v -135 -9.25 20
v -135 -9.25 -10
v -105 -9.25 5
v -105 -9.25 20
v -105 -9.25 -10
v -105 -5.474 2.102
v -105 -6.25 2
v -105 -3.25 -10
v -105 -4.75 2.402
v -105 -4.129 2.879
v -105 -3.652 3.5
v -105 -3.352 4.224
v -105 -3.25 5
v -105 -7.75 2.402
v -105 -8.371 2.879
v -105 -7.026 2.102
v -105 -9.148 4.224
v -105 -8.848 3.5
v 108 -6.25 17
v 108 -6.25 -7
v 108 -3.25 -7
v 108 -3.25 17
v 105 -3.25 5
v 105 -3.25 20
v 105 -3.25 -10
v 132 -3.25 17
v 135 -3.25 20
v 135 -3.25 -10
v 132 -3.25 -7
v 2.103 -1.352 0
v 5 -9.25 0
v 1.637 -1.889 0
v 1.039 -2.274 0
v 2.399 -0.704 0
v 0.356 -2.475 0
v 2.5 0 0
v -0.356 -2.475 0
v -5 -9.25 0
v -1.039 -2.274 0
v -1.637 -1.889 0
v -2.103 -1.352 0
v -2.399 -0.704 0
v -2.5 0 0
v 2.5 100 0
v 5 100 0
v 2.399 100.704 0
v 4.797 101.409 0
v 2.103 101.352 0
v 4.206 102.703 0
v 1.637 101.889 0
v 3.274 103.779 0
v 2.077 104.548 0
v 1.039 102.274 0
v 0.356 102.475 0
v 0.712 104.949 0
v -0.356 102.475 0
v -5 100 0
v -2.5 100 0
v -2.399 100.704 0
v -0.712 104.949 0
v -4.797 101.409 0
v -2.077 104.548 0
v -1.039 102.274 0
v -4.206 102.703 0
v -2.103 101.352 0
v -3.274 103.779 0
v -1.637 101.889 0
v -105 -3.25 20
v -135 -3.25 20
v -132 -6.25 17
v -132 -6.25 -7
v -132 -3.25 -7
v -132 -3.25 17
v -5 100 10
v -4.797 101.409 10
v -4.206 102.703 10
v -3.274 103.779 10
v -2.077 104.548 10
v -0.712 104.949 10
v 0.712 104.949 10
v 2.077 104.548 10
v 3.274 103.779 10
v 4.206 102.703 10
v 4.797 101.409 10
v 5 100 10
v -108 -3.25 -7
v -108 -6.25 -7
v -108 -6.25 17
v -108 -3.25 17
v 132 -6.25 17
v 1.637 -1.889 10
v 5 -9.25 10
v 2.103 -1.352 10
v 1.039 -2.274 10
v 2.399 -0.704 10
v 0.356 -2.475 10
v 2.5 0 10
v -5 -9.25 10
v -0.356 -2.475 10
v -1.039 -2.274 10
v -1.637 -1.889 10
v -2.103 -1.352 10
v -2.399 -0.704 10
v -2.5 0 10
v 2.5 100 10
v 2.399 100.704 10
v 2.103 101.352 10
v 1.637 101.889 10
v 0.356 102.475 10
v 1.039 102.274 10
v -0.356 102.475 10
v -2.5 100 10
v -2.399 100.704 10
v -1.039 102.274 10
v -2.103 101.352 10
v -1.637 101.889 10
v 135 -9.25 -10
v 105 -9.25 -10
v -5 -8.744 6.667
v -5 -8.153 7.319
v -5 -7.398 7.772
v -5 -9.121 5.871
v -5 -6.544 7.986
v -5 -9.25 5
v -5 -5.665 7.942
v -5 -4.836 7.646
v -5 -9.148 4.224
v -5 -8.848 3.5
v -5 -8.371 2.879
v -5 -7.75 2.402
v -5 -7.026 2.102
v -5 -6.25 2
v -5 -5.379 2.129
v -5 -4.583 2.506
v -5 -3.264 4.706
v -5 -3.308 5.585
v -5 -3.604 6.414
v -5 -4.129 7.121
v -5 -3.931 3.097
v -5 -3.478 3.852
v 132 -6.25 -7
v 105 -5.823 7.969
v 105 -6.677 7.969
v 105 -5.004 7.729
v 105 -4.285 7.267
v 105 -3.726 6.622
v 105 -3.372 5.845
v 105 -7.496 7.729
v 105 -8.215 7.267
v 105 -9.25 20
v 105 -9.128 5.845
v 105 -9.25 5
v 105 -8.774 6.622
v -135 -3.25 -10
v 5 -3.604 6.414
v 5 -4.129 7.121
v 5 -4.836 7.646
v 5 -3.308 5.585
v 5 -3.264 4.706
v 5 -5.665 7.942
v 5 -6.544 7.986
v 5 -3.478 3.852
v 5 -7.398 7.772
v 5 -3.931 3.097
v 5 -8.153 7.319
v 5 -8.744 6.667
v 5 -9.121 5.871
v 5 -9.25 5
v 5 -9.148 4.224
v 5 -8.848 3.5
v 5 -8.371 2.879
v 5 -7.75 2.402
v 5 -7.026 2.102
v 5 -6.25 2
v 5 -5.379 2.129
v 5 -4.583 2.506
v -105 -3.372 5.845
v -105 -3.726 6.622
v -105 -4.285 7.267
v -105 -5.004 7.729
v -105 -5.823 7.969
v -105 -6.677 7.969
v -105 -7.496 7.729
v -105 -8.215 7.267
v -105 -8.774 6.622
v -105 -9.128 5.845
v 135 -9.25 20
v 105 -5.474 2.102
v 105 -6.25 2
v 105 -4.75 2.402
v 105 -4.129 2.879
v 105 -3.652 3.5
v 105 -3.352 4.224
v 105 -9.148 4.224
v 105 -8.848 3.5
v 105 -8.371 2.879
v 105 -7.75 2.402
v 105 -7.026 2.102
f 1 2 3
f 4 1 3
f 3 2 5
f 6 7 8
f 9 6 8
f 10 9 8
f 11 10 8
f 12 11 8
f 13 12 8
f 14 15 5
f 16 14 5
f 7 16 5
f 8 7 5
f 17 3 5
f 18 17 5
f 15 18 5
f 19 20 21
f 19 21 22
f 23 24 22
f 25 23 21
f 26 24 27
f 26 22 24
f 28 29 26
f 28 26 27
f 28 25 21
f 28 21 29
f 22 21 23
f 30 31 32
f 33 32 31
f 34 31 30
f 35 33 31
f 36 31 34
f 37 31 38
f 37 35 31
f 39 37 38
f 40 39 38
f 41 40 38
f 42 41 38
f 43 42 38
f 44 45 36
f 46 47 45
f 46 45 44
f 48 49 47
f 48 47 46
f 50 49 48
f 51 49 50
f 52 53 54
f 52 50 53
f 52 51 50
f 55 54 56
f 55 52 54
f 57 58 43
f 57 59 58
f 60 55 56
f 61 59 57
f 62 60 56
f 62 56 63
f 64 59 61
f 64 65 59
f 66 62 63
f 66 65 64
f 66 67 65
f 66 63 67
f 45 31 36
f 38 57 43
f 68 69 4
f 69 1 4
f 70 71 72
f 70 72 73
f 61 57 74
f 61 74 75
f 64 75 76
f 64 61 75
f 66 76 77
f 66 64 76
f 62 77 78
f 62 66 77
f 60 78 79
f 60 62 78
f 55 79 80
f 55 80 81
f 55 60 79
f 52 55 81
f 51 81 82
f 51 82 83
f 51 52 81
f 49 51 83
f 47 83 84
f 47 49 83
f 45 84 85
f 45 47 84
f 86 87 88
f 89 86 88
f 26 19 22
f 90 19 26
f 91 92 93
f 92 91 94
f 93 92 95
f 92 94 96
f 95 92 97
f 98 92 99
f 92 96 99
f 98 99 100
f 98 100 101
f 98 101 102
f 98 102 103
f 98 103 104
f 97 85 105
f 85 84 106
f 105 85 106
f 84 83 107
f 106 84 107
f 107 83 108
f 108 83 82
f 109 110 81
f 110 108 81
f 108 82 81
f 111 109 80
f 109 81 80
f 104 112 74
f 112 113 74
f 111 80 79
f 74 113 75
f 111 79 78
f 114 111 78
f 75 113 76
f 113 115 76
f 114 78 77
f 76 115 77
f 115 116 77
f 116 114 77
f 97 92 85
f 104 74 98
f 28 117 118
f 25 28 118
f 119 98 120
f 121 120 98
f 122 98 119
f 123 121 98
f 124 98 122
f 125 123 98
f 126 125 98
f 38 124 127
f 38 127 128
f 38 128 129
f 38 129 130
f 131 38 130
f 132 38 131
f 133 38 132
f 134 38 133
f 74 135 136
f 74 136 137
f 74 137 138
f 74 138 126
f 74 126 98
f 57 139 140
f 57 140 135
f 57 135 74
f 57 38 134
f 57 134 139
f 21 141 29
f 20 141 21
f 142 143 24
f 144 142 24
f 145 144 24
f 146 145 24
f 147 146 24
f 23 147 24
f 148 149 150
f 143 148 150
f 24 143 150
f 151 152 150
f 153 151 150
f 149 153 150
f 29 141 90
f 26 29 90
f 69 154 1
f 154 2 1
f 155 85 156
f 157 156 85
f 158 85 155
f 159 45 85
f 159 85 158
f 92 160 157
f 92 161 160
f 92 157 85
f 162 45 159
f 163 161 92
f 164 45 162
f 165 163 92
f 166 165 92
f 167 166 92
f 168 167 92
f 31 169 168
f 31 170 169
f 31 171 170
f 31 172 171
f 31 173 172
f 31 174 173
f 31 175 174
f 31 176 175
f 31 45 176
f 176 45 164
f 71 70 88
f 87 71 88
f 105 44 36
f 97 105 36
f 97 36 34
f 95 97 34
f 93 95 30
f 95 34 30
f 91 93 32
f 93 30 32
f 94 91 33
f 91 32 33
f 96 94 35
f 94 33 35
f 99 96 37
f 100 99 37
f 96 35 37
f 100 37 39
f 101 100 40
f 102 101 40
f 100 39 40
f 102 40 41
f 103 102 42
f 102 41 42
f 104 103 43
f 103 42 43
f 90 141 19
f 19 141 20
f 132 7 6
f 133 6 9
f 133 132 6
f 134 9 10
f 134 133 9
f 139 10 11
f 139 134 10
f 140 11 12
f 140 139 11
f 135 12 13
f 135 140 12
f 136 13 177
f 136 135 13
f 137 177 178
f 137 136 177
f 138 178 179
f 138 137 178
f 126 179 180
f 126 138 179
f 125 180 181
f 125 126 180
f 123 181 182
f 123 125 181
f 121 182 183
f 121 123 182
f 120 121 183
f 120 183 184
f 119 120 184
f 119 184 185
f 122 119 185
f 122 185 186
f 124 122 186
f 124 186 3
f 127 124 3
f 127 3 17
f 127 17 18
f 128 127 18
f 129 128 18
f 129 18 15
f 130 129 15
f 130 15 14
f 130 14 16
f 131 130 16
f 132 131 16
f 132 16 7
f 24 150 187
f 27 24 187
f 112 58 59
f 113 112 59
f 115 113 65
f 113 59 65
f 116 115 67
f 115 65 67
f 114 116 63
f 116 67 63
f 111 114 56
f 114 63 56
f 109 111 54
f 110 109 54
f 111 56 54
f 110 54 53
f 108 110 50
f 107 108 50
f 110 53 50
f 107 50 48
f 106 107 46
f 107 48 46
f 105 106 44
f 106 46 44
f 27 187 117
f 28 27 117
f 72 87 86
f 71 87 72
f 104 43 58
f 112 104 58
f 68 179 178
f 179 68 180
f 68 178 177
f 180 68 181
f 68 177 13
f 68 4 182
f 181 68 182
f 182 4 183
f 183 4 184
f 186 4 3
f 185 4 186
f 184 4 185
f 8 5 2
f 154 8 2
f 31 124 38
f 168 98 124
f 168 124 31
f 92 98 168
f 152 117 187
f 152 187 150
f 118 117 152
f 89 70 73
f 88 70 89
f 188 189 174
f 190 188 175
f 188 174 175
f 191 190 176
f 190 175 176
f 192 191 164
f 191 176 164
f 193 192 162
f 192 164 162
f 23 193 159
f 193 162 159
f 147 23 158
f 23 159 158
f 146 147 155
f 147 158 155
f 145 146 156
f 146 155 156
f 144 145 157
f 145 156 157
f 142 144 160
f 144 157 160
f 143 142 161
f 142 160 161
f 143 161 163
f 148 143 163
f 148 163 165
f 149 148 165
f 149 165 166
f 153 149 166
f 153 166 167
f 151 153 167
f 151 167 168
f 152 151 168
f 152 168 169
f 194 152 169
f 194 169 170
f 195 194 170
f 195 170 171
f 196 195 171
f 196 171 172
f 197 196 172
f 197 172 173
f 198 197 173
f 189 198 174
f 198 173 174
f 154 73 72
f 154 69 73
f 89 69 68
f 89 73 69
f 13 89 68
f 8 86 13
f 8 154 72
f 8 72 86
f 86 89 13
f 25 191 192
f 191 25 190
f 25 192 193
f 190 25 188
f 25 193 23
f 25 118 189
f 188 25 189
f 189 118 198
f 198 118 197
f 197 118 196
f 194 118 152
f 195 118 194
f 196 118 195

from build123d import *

# Parameters (mm, degrees)
BOSS_EXTRUDE2_DEPTH      = 10
SKETCH3_R                = 3
BOSS_EXTRUDE3_DEPTH      = 100
BOSS_EXTRUDE3_DEPTH_BACK = 110
BOSS_EXTRUDE4_DEPTH      = 3
BOSS_EXTRUDE5_DEPTH      = 3
BOSS_EXTRUDE6_DEPTH      = 3
CUT_EXTRUDE1_REACH       = 22
SKETCH9_W                = 10
SKETCH9_H                = 0.75


with BuildPart() as part:
    # Sketch1 → Boss-Extrude2 (new body)
    with BuildSketch(Plane.XY):
        with BuildLine():
            Line((5, 100), (5, 0))
            Line((5, 0), (5, -10))
            Line((5, -10), (-5, -10))
            Line((-5, -10), (-5, 0))
            Line((-5, 0), (-5, 100))
            ThreePointArc((-5, 100), (0, 105), (5, 100))
        make_face()
        with BuildLine():
            Line((-2.5, 0), (-2.5, 100))
            ThreePointArc((-2.5, 100), (0, 102.5), (2.5, 100))
            Line((2.5, 100), (2.5, 0))
            ThreePointArc((2.5, 0), (0, -2.5), (-2.5, 0))
        make_face(mode=Mode.SUBTRACT)
    extrude(amount=BOSS_EXTRUDE2_DEPTH)

    # Sketch3 → Boss-Extrude3 (add, two sides)
    with BuildSketch(Plane(origin=(5, 0, 0), x_dir=(0, 0, -1), z_dir=(1, 0, 0))) as boss_extrude3_sk:
        with Locations((-5, -6.25)):
            Circle(SKETCH3_R)
    extrude(amount=BOSS_EXTRUDE3_DEPTH)
    extrude(boss_extrude3_sk.sketch, amount=-BOSS_EXTRUDE3_DEPTH_BACK)

    # Sketch6 → Boss-Extrude4 (add)
    with BuildSketch(Plane(origin=(0, -9.25, 0), x_dir=(-1, 0, 0), z_dir=(0, -1, 0))):
        Polygon((-105, -2), (-105, 10), (-135, 10), (-135, -20), (-105, -20), (-105, -8), align=None)
        Polygon((105, -2), (105, 10), (135, 10), (135, -20), (105, -20), (105, -8), align=None)
    extrude(amount=-BOSS_EXTRUDE4_DEPTH)

    # Sketch7 → Boss-Extrude5 (add)
    with BuildSketch(Plane(origin=(0, -6.25, 0), x_dir=(1, 0, 0), z_dir=(0, 1, 0))):
        Polygon((-105, -2), (-105, 10), (-135, 10), (-135, -20), (-105, -20), (-105, -8), align=None)
        Polygon((-108, -2), (-108, 7), (-132, 7), (-132, -17), (-108, -17), (-108, -8), align=None, mode=Mode.SUBTRACT)
    extrude(amount=BOSS_EXTRUDE5_DEPTH)

    # Sketch8 → Boss-Extrude6 (add)
    with BuildSketch(Plane(origin=(0, -6.25, 0), x_dir=(1, 0, 0), z_dir=(0, 1, 0))):
        Polygon((135, -2), (135, 10), (105, 10), (105, -20), (135, -20), (135, -8), align=None)
        Polygon((132, -2), (132, 7), (108, 7), (108, -17), (132, -17), (132, -8), align=None, mode=Mode.SUBTRACT)
    extrude(amount=BOSS_EXTRUDE6_DEPTH)

    # Sketch9 → Cut-Extrude1 (cut, up to next)
    with BuildSketch(Plane.XY.offset(10), mode=Mode.PRIVATE) as cut_extrude1_sk1:
        with Locations((0, -9.625)):
            Rectangle(SKETCH9_W, SKETCH9_H)
    cut_extrude1_tool1 = extrude(cut_extrude1_sk1.sketch, amount=-CUT_EXTRUDE1_REACH, mode=Mode.PRIVATE) & part.part
    add(cut_extrude1_tool1.solids().sort_by_distance((0, -9.625, 10))[0], mode=Mode.SUBTRACT)


solid = part.part
